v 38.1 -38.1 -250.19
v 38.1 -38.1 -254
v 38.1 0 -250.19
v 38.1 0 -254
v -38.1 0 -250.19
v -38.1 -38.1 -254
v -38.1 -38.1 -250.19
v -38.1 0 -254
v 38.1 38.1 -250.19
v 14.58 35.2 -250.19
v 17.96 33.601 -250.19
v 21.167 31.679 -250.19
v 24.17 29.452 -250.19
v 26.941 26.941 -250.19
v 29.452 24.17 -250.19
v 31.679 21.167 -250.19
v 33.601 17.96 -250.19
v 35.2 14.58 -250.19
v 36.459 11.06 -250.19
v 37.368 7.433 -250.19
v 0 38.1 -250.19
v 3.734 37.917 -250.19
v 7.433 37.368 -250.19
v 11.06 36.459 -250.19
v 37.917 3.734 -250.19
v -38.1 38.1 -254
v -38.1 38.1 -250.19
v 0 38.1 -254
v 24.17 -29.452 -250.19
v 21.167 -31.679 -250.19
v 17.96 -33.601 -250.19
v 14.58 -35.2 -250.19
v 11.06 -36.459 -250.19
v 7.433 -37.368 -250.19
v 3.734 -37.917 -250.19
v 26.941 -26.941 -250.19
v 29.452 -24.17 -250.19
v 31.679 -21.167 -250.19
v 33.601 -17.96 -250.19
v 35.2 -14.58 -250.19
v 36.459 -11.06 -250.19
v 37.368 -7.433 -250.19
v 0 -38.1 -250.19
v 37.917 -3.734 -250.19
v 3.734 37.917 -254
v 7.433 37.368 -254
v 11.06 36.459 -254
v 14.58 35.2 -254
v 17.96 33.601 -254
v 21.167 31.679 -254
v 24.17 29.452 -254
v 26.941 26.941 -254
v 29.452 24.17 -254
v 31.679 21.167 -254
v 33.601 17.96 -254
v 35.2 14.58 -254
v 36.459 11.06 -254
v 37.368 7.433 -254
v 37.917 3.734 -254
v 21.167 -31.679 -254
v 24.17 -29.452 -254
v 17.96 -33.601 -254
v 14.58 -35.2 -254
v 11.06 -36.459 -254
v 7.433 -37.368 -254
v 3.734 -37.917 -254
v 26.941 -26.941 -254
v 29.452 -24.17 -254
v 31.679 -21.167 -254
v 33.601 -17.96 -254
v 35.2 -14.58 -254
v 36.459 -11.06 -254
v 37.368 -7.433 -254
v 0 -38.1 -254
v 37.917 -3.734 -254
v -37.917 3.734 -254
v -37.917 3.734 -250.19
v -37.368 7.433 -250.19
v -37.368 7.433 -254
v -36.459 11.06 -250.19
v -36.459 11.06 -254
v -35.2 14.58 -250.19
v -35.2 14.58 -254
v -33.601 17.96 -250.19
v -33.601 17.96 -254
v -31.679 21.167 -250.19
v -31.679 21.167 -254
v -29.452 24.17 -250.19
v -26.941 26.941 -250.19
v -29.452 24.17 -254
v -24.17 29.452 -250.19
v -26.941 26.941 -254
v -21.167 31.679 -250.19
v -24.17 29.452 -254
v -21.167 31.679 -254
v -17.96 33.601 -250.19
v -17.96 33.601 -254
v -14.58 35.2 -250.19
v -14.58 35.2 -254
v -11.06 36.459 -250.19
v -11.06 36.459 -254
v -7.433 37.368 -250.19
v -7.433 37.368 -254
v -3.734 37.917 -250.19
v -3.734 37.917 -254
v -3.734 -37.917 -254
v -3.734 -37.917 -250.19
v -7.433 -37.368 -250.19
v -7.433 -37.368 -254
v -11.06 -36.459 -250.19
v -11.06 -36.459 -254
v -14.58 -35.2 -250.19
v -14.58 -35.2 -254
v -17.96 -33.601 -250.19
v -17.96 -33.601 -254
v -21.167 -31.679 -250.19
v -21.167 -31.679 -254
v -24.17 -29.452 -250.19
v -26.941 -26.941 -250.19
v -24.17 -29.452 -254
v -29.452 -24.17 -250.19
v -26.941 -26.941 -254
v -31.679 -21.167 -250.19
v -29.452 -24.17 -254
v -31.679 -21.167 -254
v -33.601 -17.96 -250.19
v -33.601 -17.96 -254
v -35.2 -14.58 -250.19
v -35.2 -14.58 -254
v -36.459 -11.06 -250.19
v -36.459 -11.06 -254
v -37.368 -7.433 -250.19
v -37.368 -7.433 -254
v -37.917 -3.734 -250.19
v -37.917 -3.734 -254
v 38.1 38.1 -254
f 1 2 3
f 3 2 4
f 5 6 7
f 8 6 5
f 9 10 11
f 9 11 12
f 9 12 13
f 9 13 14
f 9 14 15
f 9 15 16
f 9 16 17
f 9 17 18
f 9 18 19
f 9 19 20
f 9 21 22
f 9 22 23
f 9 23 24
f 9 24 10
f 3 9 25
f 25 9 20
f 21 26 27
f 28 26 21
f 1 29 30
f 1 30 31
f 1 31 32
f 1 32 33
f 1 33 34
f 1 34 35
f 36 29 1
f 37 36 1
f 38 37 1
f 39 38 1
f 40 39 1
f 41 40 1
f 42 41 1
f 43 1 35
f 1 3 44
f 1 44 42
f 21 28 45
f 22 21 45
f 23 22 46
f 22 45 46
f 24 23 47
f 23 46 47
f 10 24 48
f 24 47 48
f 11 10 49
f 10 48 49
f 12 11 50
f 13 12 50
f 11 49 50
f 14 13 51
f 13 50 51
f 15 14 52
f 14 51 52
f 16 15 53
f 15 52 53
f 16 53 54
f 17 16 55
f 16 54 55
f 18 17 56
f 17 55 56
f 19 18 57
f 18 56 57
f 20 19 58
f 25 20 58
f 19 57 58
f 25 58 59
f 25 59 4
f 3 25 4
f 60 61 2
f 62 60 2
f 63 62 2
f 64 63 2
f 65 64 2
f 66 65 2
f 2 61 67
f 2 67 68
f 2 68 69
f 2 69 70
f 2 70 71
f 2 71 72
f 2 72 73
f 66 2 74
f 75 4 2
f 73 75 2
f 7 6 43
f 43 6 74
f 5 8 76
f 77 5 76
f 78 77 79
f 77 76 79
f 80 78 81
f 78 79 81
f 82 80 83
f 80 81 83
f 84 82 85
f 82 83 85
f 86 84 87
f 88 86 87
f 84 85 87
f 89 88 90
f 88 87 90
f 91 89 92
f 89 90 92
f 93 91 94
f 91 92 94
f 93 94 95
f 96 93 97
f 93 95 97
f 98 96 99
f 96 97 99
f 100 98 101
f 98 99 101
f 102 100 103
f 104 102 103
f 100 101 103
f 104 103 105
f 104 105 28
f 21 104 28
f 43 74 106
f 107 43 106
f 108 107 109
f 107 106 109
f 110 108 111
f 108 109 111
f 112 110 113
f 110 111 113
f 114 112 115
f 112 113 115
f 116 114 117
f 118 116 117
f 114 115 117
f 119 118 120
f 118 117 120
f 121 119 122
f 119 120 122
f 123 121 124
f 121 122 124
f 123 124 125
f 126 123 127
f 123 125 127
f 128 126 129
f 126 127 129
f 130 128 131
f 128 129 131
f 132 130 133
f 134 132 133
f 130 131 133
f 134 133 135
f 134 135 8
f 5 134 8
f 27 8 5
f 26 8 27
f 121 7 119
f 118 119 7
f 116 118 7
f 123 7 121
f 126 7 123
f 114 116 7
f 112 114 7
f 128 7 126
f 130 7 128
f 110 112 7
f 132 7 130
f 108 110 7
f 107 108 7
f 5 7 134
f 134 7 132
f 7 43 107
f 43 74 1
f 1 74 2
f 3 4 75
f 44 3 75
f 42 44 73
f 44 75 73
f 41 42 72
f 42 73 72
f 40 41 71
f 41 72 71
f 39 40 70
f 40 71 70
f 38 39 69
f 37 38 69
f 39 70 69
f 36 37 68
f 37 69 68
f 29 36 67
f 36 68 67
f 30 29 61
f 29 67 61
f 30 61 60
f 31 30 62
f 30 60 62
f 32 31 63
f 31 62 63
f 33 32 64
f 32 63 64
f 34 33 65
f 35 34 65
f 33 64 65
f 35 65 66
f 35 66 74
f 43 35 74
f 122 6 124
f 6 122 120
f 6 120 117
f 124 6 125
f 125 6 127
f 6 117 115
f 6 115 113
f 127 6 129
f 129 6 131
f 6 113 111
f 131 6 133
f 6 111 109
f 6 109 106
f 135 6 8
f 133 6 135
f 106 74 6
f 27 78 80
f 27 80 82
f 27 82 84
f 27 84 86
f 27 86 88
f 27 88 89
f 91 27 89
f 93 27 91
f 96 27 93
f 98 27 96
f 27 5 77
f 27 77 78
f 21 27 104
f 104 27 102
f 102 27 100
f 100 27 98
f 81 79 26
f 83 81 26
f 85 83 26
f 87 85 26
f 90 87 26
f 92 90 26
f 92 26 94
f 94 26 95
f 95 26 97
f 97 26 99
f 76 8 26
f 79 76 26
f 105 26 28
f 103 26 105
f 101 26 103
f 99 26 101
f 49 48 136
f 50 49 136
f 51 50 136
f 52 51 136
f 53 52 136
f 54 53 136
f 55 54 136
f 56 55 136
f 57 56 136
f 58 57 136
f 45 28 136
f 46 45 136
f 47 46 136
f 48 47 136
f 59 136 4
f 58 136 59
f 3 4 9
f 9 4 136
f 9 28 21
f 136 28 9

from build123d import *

# Parameters (mm, degrees)
F4_W     = 76.2
F4_H     = 76.2
F5_DEPTH = 3.81
F7_DEPTH = 101.346


# Not quite as in the source:
# - the program builds the solid bodies; features that only make, move or delete a surface that nothing else refers to are left out


with BuildPart() as f5:
    # F4 (on offset) → F5 (new body)
    with BuildSketch(Plane.XY.offset(-254)):
        Rectangle(F4_W, F4_H)
    extrude(amount=F5_DEPTH)

    # F6 (on face) → F7 (cut)
    with BuildSketch(Plane(origin=(0, 0, -254), x_dir=(1, 0, 0), z_dir=(0, 0, -1))):
        with BuildLine():
            ThreePointArc((0, -38.1), (26.9407683632, -26.9407683632), (38.1, 0))
            ThreePointArc((38.1, 0), (26.9407683632, 26.9407683632), (0, 38.1))
            ThreePointArc((0, 38.1), (-26.9407683632, 26.9407683632), (-38.1, 0))
            ThreePointArc((-38.1, 0), (-26.9407683632, -26.9407683632), (0, -38.1))
        make_face()
    extrude(amount=-F7_DEPTH, mode=Mode.SUBTRACT)


solid = f5.part
